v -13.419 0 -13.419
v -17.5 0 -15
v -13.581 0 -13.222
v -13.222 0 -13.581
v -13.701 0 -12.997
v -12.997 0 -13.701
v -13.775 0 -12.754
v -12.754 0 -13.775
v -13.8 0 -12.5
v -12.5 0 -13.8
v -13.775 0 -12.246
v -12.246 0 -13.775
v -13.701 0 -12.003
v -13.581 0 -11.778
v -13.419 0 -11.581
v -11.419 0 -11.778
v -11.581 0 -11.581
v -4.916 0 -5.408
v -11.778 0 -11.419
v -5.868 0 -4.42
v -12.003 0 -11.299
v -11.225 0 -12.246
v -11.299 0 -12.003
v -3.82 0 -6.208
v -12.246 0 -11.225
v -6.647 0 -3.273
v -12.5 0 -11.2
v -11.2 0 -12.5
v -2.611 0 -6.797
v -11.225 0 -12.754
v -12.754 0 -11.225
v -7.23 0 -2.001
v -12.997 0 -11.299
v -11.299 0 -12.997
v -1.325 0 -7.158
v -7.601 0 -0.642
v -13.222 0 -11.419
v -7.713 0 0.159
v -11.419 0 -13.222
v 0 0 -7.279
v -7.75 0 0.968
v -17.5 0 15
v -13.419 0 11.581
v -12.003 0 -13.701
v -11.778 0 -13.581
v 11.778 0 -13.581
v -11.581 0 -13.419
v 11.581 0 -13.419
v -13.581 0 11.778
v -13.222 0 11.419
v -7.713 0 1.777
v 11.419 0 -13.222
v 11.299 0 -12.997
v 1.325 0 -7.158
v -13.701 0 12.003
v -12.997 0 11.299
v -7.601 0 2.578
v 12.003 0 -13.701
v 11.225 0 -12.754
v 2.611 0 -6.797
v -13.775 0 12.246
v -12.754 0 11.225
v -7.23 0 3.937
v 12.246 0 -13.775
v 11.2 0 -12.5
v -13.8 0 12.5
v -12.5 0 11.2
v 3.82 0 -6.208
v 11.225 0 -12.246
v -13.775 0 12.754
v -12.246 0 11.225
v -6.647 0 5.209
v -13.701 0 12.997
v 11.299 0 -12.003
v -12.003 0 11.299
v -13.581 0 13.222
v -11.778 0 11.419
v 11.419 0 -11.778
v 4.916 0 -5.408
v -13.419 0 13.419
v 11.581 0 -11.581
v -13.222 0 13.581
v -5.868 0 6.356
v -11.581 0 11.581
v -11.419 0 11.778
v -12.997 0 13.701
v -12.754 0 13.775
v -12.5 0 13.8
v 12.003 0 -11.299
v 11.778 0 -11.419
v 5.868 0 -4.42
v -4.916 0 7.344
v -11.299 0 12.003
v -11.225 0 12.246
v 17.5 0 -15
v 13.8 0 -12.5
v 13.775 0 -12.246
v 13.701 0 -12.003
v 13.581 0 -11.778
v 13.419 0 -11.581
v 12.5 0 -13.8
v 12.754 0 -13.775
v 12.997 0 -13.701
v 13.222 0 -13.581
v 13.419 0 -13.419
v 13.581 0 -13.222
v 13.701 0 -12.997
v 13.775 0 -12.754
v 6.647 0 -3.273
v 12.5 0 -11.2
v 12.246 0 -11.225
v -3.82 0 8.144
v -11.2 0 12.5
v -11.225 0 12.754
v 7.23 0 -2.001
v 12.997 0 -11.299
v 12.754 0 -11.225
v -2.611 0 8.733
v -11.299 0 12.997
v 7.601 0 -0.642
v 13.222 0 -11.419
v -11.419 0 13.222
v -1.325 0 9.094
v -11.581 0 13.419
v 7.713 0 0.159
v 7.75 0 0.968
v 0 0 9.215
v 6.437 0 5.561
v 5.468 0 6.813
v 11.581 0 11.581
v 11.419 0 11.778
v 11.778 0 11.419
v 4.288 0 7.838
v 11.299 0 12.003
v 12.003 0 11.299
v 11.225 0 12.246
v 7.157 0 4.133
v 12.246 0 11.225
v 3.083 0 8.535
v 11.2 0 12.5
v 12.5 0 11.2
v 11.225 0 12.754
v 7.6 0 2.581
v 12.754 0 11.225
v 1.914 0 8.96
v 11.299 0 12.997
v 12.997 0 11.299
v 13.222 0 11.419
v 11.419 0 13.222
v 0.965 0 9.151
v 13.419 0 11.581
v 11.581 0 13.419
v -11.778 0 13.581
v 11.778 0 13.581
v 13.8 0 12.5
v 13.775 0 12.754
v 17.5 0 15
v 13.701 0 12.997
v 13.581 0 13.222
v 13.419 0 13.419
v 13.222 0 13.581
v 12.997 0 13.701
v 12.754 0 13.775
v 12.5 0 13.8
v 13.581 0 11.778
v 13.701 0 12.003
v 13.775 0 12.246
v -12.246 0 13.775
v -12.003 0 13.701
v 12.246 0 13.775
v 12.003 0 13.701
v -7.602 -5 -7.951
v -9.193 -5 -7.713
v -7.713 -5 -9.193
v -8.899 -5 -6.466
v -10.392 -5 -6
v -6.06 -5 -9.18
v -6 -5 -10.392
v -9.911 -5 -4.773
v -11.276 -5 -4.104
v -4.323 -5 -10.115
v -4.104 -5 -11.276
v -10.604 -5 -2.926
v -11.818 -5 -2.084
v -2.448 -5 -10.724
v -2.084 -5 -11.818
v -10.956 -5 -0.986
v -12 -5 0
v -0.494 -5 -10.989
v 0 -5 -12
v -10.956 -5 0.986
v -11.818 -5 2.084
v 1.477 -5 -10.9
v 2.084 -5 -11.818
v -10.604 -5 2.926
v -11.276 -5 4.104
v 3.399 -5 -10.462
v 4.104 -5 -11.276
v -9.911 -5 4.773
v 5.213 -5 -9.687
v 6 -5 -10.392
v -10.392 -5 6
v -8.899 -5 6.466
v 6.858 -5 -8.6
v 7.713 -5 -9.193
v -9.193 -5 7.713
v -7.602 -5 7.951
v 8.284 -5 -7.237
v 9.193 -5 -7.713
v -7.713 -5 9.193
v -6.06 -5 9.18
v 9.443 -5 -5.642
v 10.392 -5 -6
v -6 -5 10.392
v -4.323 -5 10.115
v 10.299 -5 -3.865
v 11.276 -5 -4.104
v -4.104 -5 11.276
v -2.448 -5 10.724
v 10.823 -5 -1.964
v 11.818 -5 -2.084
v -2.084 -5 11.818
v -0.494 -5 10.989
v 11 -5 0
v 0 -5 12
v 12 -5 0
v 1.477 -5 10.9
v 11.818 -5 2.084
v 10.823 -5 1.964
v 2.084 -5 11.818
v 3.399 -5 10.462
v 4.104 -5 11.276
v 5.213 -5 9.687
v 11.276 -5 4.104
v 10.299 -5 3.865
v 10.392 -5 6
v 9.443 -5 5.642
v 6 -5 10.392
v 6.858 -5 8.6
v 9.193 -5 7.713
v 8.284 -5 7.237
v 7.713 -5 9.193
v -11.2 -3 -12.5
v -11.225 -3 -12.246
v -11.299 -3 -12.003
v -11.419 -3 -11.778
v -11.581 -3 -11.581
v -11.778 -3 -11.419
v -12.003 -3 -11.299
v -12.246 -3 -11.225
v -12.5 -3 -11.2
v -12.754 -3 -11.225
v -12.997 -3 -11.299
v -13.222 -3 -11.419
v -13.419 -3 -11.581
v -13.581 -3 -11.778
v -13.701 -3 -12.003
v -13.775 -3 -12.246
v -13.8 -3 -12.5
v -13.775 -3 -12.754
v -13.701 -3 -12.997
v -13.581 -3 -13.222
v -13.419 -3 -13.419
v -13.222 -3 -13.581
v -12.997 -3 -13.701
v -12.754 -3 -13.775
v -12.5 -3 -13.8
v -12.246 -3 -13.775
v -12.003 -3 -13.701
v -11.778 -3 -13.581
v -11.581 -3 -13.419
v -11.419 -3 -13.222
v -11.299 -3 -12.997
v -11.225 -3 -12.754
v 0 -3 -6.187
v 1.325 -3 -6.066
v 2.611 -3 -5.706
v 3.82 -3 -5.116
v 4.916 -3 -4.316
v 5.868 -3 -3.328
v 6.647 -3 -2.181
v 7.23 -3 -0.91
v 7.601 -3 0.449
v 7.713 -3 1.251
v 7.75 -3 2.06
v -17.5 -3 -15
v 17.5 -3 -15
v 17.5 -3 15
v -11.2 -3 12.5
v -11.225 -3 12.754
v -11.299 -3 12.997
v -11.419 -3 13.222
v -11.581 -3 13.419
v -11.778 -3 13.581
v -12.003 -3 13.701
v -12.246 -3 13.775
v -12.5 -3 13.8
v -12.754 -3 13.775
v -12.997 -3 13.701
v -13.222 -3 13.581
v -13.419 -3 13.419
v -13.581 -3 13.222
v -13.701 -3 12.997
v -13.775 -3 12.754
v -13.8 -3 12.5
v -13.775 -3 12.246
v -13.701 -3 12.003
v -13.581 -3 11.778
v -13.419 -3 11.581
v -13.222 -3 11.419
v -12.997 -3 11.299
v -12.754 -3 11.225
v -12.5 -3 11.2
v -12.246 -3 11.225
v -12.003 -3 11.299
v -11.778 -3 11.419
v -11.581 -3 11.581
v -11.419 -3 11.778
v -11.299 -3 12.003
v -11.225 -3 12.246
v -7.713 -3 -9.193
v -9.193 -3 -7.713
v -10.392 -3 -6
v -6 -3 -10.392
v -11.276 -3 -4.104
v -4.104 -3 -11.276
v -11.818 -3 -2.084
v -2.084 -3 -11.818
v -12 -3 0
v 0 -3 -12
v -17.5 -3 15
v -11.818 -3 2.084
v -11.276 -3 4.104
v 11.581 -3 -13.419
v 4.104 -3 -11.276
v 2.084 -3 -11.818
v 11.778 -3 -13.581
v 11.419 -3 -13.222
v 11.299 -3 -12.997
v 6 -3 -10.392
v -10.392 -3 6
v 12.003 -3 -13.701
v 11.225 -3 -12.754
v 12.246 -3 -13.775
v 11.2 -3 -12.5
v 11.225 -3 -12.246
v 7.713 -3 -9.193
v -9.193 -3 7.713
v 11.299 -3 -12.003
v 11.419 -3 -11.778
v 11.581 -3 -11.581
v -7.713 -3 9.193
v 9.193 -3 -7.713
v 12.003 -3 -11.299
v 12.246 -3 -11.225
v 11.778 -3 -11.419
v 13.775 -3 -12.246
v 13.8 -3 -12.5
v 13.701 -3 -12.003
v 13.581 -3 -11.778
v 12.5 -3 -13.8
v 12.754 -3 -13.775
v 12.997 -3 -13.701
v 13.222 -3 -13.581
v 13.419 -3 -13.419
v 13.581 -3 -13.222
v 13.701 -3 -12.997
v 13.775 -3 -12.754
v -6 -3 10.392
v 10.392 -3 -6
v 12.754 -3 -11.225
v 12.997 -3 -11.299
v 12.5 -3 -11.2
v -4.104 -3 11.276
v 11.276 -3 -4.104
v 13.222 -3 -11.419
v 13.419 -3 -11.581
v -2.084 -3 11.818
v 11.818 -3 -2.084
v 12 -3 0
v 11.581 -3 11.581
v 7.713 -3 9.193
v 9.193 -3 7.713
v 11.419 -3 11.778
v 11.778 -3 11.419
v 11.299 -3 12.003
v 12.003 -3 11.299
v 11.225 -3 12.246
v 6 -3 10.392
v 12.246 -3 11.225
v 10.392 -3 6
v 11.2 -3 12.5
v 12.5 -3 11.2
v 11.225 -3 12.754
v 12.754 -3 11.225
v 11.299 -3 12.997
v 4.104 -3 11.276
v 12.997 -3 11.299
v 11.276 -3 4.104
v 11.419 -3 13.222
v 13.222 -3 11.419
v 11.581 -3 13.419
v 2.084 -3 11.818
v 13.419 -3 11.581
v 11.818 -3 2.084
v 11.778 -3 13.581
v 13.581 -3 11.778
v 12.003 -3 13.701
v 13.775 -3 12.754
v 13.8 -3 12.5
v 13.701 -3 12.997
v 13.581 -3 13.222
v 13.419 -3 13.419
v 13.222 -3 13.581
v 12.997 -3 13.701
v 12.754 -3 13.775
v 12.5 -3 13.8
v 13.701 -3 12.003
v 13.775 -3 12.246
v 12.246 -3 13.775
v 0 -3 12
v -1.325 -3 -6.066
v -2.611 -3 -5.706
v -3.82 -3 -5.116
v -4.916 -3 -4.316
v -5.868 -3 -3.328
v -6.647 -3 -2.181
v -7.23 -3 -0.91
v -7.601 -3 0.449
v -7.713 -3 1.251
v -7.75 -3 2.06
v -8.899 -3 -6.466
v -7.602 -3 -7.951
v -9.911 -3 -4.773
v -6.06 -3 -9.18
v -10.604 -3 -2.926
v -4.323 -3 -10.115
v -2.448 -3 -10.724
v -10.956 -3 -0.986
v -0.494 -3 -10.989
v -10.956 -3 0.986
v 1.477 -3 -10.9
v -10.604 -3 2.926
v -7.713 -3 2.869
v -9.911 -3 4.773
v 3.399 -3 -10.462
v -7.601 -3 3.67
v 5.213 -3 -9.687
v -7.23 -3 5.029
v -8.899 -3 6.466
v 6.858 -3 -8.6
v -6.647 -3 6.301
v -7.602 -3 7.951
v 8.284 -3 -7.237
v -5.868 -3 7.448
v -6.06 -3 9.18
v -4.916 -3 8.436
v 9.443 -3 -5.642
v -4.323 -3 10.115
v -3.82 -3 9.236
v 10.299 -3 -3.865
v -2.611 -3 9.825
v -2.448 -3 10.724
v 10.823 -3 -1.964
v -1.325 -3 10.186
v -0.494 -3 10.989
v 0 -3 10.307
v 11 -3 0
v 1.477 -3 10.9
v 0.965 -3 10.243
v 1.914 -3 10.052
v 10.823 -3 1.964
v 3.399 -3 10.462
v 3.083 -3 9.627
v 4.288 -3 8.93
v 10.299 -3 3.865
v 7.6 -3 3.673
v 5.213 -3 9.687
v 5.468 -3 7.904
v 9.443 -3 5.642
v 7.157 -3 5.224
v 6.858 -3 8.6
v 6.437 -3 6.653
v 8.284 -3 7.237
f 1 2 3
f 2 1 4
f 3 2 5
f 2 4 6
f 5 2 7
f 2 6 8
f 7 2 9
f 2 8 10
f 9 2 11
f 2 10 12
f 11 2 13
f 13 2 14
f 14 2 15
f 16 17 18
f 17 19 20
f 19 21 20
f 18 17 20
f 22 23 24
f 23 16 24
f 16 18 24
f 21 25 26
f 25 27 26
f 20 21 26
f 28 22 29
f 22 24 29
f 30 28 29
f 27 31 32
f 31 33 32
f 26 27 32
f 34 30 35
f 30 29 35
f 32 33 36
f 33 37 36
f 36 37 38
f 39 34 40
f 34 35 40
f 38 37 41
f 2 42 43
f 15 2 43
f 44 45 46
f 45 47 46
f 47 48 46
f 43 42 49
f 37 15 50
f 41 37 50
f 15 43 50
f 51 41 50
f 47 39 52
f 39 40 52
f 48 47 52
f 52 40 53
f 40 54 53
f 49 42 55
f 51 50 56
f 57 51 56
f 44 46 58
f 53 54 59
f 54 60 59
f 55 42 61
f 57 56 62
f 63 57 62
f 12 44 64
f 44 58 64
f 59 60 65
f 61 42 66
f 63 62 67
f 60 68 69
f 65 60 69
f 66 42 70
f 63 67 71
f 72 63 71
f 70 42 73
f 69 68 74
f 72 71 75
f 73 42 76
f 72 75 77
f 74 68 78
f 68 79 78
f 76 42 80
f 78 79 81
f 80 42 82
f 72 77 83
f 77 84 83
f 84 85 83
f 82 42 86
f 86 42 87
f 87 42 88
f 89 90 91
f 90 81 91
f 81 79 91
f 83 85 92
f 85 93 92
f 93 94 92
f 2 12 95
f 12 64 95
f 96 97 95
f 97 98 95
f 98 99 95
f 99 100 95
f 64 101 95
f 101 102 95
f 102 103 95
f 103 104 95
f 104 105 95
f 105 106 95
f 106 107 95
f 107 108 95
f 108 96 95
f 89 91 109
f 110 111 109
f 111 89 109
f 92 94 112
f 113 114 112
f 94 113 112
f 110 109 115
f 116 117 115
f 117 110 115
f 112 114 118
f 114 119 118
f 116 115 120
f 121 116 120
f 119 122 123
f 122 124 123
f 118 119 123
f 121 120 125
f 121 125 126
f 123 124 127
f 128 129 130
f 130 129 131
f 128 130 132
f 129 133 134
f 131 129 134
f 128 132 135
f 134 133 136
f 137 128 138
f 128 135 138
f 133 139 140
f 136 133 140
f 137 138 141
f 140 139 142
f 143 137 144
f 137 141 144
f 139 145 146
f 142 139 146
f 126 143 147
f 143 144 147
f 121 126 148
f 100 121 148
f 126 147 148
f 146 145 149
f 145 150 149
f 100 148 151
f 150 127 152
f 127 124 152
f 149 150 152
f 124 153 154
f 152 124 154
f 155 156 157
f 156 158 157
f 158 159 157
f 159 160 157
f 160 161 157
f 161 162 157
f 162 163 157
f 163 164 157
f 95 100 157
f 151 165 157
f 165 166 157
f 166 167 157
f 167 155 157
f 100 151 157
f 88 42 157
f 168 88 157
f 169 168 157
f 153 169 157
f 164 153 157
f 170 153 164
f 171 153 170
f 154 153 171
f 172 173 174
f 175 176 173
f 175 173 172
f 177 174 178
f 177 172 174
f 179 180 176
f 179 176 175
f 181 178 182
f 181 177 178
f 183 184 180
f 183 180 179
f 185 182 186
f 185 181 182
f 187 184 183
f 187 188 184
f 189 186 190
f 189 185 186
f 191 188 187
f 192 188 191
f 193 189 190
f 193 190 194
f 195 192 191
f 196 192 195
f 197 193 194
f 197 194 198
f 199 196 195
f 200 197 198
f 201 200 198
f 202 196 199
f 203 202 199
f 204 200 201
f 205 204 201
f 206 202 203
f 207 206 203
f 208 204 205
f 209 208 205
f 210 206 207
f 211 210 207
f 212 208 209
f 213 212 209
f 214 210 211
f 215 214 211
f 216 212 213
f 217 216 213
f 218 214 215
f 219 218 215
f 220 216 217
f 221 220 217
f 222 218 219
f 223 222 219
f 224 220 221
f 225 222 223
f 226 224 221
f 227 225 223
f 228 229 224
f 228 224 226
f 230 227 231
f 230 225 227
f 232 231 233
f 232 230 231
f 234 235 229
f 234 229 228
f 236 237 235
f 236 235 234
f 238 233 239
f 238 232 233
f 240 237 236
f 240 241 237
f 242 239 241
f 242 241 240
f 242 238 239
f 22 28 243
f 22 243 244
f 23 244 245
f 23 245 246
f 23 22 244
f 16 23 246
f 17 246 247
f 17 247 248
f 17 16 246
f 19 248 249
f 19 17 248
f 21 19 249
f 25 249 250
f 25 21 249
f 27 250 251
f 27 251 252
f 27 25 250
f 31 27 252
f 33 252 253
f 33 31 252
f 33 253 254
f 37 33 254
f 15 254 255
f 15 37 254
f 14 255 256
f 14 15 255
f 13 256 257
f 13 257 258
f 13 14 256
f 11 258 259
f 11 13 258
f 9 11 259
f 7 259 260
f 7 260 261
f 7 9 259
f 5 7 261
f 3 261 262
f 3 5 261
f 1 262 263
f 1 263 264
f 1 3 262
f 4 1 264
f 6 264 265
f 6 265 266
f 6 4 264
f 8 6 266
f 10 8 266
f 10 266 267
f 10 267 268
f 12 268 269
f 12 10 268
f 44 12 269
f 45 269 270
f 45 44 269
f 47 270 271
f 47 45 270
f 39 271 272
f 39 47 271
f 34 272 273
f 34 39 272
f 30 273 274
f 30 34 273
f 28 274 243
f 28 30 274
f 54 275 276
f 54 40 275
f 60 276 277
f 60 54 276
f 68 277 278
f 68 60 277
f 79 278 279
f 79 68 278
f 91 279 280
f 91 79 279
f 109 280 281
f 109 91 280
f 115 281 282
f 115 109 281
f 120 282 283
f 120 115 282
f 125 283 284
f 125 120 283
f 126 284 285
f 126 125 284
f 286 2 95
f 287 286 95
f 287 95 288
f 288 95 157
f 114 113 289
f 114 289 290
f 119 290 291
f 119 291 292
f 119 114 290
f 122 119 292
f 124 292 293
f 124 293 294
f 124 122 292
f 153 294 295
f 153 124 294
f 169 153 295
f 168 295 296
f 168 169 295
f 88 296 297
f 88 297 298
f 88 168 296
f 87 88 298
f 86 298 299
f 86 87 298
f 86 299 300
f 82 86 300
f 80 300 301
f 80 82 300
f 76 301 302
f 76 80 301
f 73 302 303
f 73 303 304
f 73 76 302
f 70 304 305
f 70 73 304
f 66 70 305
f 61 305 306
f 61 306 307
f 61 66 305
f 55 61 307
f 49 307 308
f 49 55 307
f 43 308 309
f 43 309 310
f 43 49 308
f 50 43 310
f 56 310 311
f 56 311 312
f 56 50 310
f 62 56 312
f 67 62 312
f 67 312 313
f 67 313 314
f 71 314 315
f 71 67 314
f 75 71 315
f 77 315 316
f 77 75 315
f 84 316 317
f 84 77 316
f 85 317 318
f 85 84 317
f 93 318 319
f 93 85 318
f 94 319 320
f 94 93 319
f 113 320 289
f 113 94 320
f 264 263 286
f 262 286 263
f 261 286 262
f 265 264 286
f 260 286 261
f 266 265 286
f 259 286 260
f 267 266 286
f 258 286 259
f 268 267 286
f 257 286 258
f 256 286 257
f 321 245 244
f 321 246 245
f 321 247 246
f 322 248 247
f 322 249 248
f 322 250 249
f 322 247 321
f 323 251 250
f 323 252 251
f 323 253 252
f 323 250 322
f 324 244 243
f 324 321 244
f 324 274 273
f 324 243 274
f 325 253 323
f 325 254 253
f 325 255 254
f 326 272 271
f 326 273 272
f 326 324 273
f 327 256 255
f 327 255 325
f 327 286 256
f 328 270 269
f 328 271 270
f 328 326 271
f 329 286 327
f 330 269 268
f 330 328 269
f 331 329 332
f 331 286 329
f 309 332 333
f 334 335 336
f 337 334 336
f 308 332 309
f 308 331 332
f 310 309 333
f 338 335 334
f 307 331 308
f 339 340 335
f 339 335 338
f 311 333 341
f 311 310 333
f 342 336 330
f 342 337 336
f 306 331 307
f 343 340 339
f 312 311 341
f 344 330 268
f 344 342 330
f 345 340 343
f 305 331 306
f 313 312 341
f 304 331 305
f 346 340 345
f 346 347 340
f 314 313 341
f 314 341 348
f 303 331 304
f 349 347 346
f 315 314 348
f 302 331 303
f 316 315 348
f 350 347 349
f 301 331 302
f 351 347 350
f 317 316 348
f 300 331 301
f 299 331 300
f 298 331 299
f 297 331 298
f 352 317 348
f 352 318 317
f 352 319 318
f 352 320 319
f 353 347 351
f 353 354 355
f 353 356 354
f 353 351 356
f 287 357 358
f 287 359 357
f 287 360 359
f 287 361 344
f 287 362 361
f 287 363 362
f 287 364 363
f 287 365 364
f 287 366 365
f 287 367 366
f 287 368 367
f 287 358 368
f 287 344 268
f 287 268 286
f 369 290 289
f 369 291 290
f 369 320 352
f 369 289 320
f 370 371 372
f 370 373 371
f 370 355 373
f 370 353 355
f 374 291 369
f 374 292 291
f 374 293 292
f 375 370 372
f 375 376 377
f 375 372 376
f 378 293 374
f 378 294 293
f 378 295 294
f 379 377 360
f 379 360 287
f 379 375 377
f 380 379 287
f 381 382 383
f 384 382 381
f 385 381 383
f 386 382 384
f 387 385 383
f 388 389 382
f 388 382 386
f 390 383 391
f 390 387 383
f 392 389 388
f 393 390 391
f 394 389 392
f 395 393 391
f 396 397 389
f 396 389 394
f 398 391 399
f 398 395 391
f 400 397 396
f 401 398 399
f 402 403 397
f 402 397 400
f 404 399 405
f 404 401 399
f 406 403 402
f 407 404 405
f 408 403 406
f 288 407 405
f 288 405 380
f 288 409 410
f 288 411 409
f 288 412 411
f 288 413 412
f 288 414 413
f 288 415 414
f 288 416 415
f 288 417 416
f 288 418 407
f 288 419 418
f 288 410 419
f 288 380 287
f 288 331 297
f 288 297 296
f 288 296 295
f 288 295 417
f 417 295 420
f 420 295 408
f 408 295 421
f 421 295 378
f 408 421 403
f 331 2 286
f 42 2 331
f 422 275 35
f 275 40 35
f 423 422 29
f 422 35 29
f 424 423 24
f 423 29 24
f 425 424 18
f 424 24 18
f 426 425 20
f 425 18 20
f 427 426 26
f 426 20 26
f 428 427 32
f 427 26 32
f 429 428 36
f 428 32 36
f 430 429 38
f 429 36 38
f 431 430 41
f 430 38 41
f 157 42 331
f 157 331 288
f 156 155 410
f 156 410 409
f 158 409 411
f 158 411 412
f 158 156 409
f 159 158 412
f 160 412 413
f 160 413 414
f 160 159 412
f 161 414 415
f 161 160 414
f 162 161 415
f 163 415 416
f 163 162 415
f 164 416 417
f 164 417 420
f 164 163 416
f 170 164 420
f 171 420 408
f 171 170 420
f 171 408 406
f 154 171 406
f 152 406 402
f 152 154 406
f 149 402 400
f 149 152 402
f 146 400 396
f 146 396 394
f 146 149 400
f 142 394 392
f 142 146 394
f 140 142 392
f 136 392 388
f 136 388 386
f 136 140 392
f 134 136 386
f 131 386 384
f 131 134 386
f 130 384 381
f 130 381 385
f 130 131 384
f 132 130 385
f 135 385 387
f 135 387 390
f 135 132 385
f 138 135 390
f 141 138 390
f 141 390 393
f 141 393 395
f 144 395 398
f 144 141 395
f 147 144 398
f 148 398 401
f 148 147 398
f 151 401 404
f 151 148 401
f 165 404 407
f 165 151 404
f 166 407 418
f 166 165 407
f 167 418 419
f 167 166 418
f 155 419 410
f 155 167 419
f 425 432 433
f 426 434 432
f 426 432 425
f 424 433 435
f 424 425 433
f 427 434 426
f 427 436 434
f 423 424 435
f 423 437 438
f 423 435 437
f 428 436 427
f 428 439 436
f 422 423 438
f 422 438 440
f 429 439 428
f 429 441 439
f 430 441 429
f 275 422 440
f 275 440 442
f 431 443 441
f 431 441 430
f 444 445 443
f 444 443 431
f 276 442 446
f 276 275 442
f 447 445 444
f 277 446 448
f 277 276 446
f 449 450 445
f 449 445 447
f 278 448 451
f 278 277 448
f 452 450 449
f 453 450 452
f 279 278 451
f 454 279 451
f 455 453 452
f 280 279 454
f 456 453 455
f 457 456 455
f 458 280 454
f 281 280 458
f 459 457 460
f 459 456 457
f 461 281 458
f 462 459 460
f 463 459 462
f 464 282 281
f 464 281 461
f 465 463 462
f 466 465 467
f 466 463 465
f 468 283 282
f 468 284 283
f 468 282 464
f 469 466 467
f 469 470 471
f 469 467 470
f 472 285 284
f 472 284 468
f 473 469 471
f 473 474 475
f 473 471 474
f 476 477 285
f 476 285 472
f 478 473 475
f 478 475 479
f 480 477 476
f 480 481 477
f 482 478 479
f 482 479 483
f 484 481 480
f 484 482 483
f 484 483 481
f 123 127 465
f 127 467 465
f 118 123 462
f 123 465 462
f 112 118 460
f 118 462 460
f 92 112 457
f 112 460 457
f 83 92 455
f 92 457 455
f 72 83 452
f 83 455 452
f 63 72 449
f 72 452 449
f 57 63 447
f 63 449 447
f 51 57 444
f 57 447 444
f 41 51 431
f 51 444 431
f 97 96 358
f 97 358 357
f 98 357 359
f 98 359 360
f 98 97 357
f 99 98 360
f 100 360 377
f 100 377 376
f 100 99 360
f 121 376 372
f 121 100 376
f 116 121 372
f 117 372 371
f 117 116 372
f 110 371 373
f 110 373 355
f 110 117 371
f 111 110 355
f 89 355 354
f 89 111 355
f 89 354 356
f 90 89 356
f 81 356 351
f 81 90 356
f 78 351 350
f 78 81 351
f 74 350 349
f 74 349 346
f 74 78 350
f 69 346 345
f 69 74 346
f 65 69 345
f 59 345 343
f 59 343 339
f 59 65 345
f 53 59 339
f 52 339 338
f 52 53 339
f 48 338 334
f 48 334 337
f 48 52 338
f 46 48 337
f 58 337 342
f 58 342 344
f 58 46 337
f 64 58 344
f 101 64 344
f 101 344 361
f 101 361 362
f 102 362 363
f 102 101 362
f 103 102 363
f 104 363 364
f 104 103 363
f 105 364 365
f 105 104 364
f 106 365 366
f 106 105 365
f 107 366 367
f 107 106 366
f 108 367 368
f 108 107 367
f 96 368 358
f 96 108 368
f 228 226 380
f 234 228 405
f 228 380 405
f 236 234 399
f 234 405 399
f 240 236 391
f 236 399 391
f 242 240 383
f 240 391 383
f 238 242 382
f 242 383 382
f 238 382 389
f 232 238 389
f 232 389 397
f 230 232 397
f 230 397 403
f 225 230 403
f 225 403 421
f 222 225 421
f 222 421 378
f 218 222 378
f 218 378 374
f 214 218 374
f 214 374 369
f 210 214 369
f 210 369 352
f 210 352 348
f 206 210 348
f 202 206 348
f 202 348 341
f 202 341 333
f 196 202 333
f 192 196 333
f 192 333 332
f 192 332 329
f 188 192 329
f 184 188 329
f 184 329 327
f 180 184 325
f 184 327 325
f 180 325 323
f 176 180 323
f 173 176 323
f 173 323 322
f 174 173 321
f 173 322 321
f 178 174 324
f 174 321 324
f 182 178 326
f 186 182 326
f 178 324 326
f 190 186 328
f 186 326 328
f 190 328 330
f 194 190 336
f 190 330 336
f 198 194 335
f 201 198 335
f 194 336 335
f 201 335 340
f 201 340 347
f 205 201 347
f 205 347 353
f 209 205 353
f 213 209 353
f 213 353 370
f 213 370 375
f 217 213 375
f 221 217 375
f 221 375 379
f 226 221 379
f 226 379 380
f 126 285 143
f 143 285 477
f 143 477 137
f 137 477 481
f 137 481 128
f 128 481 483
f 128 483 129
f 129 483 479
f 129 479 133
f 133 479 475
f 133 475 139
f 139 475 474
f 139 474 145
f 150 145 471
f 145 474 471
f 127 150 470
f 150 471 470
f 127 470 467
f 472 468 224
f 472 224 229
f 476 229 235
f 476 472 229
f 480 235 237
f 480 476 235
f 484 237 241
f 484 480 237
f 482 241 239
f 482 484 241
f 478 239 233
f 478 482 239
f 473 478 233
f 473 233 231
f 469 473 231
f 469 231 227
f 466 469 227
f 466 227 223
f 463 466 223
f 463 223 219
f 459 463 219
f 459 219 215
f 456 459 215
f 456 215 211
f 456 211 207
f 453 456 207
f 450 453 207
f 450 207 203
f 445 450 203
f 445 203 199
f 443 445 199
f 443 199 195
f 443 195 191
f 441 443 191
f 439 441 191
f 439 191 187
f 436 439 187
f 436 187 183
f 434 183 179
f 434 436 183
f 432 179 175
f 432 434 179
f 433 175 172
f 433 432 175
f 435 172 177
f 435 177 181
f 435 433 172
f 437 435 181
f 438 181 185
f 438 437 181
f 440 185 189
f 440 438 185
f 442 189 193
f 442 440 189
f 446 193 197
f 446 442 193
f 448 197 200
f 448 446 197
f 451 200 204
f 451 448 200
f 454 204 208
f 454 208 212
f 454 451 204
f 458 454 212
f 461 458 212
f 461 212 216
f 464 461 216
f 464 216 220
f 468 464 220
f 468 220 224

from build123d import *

# Parameters (mm, degrees)
F0_W     = 35
F0_H     = 30
F0_R     = 1.3
F0_R_2   = 12
F0_R_3   = 11
F1_DEPTH = 3
F3_DEPTH = 7.75
F4_R     = 7.74999
F5_DEPTH = 5


# Not quite as in the source:
# - a fillet or chamfer is up to 0.001 mm smaller than in the source, because OpenCascade refuses the exact size


with BuildPart() as f1:
    # F0 (on Front) → F1 (new body)
    with BuildSketch(Plane.XZ):
        Rectangle(F0_W, F0_H)
        with Locations((-12.5, -12.5)):
            Circle(F0_R, mode=Mode.SUBTRACT)
        with Locations((12.5, -12.5)):
            Circle(F0_R, mode=Mode.SUBTRACT)
        with Locations((-12.5, 12.5)):
            Circle(F0_R, mode=Mode.SUBTRACT)
        Circle(F0_R_2, mode=Mode.SUBTRACT)
        with Locations((12.5, 12.5)):
            Circle(F0_R, mode=Mode.SUBTRACT)
        Circle(F0_R_2)
        Circle(F0_R_3, mode=Mode.SUBTRACT)
        Circle(F0_R_3)
    extrude(amount=F1_DEPTH)

    # F2 (on Right) → F3 (cut, symmetric)
    with BuildSketch(Plane.YZ):
        Polygon((24.7599773954, -16.2912994583), (30.0612896169, -1.7260638362), (-14.6986877785, 14.5652356222), (-20, 0), align=None)
    extrude(amount=F3_DEPTH, both=True, mode=Mode.SUBTRACT)

    # F4 (radius 7.75 in the source; OpenCascade refuses exactly that, so slightly less here)
    f4_edges = [f1.edges().sort_by_distance(p)[0] for p in [
        (7.75, -1.5, 9.761306),
        (-7.75, -1.5, 9.761306),
        (-7.75, -1.5, -6.733449),
        (7.75, -1.5, -6.733449),
    ]]
    fillet(f4_edges, radius=F4_R)

    # F0 (on Front) → F5 (join)
    with BuildSketch(Plane.XZ):
        Circle(F0_R_2)
        Circle(F0_R_3, mode=Mode.SUBTRACT)
    extrude(amount=F5_DEPTH)


solid = f1.part
